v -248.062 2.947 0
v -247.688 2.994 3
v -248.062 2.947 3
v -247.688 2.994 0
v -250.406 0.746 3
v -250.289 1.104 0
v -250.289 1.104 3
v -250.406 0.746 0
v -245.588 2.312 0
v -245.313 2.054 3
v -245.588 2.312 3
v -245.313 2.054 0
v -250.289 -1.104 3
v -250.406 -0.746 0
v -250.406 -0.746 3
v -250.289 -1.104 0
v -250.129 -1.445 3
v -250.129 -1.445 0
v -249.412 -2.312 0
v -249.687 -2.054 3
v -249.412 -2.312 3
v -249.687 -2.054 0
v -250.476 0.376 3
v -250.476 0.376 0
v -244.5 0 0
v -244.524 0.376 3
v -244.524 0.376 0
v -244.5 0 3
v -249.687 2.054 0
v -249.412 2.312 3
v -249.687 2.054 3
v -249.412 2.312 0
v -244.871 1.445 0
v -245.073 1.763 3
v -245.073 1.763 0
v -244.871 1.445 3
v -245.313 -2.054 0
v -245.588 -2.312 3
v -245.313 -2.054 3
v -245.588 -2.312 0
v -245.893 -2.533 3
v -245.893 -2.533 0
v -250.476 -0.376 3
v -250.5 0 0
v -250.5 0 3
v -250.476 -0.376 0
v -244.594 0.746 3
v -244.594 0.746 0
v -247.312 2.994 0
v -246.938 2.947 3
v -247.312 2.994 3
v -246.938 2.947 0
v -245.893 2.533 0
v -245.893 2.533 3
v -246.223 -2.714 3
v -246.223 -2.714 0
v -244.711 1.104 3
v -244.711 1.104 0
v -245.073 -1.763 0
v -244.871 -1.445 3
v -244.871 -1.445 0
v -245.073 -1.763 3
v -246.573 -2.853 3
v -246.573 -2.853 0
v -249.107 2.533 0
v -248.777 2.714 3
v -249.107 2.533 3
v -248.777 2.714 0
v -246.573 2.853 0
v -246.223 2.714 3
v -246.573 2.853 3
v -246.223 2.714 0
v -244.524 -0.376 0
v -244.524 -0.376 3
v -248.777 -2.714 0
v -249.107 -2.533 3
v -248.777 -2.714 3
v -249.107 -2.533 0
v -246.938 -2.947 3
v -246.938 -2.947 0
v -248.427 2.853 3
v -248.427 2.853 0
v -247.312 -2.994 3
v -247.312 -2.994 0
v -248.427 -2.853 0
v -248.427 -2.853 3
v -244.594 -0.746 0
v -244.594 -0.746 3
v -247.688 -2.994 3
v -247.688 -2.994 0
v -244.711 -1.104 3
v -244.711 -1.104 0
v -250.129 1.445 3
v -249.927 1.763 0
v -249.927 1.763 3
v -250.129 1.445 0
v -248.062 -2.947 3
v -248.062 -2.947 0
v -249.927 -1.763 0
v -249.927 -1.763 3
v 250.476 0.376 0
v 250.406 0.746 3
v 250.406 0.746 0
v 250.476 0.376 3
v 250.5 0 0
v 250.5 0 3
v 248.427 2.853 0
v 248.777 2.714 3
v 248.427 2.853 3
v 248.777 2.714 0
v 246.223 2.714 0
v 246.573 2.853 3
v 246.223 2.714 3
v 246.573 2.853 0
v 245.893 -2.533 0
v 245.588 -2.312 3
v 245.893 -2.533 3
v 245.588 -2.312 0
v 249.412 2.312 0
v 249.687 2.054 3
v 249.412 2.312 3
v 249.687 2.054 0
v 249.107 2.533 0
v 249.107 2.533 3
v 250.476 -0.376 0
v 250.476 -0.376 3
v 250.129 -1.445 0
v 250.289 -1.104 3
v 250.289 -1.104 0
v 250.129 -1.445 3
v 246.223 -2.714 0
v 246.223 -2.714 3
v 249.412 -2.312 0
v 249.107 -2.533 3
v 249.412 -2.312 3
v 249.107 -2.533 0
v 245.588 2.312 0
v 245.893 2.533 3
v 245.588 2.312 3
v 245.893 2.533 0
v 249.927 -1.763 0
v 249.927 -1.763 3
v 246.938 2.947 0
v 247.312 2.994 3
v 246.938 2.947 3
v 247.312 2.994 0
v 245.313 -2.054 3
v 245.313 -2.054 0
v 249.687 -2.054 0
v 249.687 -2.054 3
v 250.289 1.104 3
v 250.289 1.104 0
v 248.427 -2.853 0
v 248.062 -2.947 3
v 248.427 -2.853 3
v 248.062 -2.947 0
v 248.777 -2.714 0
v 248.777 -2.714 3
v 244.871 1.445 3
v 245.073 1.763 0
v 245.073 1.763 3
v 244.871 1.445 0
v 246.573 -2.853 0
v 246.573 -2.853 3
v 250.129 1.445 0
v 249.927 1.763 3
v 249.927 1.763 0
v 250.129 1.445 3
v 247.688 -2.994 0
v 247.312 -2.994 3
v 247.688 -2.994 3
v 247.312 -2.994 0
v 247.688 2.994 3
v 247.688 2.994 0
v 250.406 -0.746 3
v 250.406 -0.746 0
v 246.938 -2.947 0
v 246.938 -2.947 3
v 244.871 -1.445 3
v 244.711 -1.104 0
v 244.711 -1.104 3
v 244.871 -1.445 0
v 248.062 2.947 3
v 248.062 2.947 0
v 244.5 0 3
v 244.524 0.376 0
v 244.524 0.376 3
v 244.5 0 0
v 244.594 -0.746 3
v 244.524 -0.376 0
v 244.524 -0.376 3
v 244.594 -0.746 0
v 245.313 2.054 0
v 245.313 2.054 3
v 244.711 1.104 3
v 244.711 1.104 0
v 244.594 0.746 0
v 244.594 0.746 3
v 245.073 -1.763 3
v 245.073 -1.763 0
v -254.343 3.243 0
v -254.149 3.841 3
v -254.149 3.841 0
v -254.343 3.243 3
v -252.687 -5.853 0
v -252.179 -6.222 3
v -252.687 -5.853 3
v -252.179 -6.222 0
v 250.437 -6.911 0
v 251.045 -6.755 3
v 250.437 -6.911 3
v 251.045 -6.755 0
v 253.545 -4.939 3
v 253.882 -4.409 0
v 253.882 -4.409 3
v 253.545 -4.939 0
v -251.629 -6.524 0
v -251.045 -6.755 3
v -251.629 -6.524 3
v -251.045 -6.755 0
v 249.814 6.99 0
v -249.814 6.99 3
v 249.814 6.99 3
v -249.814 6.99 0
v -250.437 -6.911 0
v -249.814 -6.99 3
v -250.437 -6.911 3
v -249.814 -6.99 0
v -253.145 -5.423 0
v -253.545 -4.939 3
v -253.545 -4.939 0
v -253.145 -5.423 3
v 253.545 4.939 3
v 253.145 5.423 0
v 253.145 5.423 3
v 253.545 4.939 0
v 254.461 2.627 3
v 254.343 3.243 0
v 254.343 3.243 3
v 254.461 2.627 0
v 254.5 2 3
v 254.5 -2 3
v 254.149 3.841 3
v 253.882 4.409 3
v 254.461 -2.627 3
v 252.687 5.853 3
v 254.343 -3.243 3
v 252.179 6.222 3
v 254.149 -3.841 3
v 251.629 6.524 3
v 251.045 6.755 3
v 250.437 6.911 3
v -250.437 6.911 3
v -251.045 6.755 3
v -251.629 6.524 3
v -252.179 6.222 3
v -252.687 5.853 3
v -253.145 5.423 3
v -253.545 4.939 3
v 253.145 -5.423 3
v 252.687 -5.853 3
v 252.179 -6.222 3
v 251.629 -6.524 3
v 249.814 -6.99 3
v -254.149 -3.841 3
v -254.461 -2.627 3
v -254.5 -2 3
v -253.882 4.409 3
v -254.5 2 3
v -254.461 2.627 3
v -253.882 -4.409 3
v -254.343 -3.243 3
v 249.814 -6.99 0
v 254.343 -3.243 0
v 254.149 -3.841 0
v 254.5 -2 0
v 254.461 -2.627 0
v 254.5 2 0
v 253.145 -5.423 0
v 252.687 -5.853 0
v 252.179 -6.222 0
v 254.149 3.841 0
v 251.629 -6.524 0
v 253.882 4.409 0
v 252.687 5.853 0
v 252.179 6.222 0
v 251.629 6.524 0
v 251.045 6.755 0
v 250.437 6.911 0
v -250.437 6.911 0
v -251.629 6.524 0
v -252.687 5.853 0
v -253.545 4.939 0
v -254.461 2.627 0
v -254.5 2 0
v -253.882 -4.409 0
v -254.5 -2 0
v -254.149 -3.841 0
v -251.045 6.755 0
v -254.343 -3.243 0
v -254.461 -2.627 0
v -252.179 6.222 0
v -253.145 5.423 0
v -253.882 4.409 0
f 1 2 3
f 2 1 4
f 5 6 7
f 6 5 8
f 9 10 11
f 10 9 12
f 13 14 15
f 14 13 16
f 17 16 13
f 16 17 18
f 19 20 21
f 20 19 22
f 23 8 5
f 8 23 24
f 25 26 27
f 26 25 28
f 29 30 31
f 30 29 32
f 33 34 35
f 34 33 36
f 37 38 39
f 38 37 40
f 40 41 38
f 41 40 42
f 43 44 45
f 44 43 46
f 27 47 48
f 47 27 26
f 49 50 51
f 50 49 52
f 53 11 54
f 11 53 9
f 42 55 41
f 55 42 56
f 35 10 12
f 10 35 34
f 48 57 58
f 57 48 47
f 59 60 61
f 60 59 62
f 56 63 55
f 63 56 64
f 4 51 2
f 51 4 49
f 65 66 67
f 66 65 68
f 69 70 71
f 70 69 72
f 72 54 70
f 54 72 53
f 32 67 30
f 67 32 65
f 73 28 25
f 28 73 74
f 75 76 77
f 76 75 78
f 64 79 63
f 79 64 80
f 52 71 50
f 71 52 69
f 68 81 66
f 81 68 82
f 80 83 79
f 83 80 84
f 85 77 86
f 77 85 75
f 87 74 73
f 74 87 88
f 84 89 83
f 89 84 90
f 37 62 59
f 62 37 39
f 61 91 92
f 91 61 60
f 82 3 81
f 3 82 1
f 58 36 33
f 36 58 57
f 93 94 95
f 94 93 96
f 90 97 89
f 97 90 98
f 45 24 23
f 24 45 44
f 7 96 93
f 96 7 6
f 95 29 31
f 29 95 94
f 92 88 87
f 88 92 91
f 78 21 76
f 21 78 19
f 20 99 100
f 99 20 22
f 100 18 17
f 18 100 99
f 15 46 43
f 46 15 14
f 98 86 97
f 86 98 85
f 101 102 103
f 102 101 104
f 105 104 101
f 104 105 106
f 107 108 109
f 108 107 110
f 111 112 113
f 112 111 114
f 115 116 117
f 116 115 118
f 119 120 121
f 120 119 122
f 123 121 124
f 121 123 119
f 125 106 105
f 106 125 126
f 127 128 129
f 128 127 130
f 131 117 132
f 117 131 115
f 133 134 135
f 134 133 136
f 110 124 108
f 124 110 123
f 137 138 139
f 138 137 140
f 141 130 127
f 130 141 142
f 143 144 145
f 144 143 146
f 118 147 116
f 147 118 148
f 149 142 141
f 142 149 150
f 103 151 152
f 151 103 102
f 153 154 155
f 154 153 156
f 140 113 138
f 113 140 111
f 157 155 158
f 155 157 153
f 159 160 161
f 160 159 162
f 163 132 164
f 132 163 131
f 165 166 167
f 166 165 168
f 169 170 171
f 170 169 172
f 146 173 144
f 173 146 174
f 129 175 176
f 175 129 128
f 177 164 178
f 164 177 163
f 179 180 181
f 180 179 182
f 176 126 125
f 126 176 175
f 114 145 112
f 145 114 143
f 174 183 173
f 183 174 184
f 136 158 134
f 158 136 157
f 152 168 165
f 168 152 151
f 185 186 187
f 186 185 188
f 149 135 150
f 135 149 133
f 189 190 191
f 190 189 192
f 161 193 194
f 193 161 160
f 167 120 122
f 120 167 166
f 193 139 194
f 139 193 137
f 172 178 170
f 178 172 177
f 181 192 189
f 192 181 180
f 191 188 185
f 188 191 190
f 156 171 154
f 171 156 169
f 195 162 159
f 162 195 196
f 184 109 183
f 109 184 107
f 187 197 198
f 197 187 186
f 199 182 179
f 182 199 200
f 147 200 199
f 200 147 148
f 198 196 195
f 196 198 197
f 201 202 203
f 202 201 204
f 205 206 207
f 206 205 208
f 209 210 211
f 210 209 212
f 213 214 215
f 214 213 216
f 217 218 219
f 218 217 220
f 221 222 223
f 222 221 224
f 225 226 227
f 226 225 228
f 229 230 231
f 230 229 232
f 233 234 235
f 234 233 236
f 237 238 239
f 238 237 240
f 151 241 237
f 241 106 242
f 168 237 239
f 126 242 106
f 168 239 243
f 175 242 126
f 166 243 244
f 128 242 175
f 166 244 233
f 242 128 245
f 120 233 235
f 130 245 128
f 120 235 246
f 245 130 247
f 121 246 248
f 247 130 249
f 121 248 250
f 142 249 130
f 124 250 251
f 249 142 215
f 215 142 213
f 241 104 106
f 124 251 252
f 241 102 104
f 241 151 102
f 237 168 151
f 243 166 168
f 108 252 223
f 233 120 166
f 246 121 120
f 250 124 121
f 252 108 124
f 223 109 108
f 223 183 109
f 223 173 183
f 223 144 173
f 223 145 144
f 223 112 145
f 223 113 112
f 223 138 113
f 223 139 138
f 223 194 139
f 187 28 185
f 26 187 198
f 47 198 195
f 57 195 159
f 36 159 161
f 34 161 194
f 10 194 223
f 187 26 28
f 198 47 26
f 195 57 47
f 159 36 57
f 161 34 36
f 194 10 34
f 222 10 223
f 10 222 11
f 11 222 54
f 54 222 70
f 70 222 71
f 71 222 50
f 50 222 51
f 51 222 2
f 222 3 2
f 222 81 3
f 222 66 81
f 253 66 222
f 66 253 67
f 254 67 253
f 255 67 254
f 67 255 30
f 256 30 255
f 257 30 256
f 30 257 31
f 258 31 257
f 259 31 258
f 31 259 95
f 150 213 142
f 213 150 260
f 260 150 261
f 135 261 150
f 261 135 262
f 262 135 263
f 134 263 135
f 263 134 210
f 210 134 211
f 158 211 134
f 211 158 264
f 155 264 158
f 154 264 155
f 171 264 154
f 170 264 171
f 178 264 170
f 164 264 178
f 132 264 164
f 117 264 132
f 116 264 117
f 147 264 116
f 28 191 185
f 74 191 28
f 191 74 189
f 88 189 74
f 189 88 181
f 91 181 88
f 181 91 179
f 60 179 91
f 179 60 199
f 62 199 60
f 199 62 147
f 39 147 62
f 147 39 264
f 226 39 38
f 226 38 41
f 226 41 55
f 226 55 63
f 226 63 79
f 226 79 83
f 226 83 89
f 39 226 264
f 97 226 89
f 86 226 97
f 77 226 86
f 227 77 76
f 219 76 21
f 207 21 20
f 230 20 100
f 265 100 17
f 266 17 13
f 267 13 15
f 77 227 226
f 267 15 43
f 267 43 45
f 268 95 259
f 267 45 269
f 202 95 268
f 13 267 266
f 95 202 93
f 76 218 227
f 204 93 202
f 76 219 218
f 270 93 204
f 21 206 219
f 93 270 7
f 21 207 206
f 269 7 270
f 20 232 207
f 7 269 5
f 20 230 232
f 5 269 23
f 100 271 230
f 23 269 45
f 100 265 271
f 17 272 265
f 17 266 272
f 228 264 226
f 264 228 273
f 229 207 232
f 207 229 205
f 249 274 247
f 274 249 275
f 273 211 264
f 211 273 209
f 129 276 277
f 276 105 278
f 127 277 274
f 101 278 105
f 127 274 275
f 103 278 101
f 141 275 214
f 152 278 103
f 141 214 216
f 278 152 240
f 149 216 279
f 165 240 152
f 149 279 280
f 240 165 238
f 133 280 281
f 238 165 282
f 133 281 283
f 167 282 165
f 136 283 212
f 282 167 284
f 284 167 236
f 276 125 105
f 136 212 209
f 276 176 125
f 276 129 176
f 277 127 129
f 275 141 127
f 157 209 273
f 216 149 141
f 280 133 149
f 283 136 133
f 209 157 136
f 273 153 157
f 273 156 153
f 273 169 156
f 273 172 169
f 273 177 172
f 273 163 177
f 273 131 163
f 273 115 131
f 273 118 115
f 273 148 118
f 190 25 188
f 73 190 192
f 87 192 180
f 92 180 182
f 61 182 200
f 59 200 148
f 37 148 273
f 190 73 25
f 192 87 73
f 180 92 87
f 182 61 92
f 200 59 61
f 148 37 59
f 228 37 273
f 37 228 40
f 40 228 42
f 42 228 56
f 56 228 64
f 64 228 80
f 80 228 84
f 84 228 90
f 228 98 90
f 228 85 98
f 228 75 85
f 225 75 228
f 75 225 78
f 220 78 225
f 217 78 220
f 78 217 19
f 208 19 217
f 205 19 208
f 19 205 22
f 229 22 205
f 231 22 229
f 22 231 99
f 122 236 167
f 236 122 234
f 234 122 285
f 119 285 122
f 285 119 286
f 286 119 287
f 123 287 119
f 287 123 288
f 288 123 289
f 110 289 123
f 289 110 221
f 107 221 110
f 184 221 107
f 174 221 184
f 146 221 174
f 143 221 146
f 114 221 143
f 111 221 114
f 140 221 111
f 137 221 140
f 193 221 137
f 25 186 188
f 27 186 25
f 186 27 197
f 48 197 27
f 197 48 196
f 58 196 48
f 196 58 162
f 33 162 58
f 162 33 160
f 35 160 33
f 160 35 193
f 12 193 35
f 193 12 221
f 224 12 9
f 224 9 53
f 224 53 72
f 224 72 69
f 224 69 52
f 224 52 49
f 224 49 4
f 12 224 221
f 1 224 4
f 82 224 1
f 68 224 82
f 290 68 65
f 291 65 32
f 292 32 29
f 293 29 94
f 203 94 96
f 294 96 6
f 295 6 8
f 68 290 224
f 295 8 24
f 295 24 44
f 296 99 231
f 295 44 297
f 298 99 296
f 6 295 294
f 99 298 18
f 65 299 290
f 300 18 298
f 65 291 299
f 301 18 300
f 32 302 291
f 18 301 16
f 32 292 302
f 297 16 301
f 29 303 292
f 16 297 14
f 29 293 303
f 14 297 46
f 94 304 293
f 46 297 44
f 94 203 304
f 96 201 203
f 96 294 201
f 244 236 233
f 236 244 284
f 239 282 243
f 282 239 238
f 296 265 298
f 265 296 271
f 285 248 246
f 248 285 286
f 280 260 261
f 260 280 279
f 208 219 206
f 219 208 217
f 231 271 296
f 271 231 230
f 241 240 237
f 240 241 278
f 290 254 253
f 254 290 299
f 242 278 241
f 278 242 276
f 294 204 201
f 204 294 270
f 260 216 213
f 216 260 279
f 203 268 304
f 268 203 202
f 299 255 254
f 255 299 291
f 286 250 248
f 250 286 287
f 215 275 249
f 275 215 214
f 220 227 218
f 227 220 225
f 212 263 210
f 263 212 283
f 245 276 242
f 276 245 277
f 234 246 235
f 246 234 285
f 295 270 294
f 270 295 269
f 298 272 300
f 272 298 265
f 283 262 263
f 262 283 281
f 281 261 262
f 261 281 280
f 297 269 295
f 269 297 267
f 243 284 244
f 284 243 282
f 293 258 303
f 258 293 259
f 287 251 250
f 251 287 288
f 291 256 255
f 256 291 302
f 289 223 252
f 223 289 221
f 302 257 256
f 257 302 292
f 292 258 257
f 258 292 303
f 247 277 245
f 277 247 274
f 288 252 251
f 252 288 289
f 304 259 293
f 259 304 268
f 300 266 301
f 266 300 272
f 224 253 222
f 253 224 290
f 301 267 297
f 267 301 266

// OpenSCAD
$fn = 50;


difference() {
	union() {
		hull() {
			translate(v = [-249.5000000000, 2.0000000000, 0]) {
				cylinder(h = 3, r = 5);
			}
			translate(v = [249.5000000000, 2.0000000000, 0]) {
				cylinder(h = 3, r = 5);
			}
			translate(v = [-249.5000000000, -2.0000000000, 0]) {
				cylinder(h = 3, r = 5);
			}
			translate(v = [249.5000000000, -2.0000000000, 0]) {
				cylinder(h = 3, r = 5);
			}
		}
	}
	union() {
		translate(v = [-247.5000000000, 0.0000000000, -100.0000000000]) {
			cylinder(h = 200, r = 3.0000000000);
		}
		translate(v = [-247.5000000000, 0.0000000000, -100.0000000000]) {
			cylinder(h = 200, r = 3.0000000000);
		}
		translate(v = [247.5000000000, 0.0000000000, -100.0000000000]) {
			cylinder(h = 200, r = 3.0000000000);
		}
		translate(v = [247.5000000000, 0.0000000000, -100.0000000000]) {
			cylinder(h = 200, r = 3.0000000000);
		}
	}
}
